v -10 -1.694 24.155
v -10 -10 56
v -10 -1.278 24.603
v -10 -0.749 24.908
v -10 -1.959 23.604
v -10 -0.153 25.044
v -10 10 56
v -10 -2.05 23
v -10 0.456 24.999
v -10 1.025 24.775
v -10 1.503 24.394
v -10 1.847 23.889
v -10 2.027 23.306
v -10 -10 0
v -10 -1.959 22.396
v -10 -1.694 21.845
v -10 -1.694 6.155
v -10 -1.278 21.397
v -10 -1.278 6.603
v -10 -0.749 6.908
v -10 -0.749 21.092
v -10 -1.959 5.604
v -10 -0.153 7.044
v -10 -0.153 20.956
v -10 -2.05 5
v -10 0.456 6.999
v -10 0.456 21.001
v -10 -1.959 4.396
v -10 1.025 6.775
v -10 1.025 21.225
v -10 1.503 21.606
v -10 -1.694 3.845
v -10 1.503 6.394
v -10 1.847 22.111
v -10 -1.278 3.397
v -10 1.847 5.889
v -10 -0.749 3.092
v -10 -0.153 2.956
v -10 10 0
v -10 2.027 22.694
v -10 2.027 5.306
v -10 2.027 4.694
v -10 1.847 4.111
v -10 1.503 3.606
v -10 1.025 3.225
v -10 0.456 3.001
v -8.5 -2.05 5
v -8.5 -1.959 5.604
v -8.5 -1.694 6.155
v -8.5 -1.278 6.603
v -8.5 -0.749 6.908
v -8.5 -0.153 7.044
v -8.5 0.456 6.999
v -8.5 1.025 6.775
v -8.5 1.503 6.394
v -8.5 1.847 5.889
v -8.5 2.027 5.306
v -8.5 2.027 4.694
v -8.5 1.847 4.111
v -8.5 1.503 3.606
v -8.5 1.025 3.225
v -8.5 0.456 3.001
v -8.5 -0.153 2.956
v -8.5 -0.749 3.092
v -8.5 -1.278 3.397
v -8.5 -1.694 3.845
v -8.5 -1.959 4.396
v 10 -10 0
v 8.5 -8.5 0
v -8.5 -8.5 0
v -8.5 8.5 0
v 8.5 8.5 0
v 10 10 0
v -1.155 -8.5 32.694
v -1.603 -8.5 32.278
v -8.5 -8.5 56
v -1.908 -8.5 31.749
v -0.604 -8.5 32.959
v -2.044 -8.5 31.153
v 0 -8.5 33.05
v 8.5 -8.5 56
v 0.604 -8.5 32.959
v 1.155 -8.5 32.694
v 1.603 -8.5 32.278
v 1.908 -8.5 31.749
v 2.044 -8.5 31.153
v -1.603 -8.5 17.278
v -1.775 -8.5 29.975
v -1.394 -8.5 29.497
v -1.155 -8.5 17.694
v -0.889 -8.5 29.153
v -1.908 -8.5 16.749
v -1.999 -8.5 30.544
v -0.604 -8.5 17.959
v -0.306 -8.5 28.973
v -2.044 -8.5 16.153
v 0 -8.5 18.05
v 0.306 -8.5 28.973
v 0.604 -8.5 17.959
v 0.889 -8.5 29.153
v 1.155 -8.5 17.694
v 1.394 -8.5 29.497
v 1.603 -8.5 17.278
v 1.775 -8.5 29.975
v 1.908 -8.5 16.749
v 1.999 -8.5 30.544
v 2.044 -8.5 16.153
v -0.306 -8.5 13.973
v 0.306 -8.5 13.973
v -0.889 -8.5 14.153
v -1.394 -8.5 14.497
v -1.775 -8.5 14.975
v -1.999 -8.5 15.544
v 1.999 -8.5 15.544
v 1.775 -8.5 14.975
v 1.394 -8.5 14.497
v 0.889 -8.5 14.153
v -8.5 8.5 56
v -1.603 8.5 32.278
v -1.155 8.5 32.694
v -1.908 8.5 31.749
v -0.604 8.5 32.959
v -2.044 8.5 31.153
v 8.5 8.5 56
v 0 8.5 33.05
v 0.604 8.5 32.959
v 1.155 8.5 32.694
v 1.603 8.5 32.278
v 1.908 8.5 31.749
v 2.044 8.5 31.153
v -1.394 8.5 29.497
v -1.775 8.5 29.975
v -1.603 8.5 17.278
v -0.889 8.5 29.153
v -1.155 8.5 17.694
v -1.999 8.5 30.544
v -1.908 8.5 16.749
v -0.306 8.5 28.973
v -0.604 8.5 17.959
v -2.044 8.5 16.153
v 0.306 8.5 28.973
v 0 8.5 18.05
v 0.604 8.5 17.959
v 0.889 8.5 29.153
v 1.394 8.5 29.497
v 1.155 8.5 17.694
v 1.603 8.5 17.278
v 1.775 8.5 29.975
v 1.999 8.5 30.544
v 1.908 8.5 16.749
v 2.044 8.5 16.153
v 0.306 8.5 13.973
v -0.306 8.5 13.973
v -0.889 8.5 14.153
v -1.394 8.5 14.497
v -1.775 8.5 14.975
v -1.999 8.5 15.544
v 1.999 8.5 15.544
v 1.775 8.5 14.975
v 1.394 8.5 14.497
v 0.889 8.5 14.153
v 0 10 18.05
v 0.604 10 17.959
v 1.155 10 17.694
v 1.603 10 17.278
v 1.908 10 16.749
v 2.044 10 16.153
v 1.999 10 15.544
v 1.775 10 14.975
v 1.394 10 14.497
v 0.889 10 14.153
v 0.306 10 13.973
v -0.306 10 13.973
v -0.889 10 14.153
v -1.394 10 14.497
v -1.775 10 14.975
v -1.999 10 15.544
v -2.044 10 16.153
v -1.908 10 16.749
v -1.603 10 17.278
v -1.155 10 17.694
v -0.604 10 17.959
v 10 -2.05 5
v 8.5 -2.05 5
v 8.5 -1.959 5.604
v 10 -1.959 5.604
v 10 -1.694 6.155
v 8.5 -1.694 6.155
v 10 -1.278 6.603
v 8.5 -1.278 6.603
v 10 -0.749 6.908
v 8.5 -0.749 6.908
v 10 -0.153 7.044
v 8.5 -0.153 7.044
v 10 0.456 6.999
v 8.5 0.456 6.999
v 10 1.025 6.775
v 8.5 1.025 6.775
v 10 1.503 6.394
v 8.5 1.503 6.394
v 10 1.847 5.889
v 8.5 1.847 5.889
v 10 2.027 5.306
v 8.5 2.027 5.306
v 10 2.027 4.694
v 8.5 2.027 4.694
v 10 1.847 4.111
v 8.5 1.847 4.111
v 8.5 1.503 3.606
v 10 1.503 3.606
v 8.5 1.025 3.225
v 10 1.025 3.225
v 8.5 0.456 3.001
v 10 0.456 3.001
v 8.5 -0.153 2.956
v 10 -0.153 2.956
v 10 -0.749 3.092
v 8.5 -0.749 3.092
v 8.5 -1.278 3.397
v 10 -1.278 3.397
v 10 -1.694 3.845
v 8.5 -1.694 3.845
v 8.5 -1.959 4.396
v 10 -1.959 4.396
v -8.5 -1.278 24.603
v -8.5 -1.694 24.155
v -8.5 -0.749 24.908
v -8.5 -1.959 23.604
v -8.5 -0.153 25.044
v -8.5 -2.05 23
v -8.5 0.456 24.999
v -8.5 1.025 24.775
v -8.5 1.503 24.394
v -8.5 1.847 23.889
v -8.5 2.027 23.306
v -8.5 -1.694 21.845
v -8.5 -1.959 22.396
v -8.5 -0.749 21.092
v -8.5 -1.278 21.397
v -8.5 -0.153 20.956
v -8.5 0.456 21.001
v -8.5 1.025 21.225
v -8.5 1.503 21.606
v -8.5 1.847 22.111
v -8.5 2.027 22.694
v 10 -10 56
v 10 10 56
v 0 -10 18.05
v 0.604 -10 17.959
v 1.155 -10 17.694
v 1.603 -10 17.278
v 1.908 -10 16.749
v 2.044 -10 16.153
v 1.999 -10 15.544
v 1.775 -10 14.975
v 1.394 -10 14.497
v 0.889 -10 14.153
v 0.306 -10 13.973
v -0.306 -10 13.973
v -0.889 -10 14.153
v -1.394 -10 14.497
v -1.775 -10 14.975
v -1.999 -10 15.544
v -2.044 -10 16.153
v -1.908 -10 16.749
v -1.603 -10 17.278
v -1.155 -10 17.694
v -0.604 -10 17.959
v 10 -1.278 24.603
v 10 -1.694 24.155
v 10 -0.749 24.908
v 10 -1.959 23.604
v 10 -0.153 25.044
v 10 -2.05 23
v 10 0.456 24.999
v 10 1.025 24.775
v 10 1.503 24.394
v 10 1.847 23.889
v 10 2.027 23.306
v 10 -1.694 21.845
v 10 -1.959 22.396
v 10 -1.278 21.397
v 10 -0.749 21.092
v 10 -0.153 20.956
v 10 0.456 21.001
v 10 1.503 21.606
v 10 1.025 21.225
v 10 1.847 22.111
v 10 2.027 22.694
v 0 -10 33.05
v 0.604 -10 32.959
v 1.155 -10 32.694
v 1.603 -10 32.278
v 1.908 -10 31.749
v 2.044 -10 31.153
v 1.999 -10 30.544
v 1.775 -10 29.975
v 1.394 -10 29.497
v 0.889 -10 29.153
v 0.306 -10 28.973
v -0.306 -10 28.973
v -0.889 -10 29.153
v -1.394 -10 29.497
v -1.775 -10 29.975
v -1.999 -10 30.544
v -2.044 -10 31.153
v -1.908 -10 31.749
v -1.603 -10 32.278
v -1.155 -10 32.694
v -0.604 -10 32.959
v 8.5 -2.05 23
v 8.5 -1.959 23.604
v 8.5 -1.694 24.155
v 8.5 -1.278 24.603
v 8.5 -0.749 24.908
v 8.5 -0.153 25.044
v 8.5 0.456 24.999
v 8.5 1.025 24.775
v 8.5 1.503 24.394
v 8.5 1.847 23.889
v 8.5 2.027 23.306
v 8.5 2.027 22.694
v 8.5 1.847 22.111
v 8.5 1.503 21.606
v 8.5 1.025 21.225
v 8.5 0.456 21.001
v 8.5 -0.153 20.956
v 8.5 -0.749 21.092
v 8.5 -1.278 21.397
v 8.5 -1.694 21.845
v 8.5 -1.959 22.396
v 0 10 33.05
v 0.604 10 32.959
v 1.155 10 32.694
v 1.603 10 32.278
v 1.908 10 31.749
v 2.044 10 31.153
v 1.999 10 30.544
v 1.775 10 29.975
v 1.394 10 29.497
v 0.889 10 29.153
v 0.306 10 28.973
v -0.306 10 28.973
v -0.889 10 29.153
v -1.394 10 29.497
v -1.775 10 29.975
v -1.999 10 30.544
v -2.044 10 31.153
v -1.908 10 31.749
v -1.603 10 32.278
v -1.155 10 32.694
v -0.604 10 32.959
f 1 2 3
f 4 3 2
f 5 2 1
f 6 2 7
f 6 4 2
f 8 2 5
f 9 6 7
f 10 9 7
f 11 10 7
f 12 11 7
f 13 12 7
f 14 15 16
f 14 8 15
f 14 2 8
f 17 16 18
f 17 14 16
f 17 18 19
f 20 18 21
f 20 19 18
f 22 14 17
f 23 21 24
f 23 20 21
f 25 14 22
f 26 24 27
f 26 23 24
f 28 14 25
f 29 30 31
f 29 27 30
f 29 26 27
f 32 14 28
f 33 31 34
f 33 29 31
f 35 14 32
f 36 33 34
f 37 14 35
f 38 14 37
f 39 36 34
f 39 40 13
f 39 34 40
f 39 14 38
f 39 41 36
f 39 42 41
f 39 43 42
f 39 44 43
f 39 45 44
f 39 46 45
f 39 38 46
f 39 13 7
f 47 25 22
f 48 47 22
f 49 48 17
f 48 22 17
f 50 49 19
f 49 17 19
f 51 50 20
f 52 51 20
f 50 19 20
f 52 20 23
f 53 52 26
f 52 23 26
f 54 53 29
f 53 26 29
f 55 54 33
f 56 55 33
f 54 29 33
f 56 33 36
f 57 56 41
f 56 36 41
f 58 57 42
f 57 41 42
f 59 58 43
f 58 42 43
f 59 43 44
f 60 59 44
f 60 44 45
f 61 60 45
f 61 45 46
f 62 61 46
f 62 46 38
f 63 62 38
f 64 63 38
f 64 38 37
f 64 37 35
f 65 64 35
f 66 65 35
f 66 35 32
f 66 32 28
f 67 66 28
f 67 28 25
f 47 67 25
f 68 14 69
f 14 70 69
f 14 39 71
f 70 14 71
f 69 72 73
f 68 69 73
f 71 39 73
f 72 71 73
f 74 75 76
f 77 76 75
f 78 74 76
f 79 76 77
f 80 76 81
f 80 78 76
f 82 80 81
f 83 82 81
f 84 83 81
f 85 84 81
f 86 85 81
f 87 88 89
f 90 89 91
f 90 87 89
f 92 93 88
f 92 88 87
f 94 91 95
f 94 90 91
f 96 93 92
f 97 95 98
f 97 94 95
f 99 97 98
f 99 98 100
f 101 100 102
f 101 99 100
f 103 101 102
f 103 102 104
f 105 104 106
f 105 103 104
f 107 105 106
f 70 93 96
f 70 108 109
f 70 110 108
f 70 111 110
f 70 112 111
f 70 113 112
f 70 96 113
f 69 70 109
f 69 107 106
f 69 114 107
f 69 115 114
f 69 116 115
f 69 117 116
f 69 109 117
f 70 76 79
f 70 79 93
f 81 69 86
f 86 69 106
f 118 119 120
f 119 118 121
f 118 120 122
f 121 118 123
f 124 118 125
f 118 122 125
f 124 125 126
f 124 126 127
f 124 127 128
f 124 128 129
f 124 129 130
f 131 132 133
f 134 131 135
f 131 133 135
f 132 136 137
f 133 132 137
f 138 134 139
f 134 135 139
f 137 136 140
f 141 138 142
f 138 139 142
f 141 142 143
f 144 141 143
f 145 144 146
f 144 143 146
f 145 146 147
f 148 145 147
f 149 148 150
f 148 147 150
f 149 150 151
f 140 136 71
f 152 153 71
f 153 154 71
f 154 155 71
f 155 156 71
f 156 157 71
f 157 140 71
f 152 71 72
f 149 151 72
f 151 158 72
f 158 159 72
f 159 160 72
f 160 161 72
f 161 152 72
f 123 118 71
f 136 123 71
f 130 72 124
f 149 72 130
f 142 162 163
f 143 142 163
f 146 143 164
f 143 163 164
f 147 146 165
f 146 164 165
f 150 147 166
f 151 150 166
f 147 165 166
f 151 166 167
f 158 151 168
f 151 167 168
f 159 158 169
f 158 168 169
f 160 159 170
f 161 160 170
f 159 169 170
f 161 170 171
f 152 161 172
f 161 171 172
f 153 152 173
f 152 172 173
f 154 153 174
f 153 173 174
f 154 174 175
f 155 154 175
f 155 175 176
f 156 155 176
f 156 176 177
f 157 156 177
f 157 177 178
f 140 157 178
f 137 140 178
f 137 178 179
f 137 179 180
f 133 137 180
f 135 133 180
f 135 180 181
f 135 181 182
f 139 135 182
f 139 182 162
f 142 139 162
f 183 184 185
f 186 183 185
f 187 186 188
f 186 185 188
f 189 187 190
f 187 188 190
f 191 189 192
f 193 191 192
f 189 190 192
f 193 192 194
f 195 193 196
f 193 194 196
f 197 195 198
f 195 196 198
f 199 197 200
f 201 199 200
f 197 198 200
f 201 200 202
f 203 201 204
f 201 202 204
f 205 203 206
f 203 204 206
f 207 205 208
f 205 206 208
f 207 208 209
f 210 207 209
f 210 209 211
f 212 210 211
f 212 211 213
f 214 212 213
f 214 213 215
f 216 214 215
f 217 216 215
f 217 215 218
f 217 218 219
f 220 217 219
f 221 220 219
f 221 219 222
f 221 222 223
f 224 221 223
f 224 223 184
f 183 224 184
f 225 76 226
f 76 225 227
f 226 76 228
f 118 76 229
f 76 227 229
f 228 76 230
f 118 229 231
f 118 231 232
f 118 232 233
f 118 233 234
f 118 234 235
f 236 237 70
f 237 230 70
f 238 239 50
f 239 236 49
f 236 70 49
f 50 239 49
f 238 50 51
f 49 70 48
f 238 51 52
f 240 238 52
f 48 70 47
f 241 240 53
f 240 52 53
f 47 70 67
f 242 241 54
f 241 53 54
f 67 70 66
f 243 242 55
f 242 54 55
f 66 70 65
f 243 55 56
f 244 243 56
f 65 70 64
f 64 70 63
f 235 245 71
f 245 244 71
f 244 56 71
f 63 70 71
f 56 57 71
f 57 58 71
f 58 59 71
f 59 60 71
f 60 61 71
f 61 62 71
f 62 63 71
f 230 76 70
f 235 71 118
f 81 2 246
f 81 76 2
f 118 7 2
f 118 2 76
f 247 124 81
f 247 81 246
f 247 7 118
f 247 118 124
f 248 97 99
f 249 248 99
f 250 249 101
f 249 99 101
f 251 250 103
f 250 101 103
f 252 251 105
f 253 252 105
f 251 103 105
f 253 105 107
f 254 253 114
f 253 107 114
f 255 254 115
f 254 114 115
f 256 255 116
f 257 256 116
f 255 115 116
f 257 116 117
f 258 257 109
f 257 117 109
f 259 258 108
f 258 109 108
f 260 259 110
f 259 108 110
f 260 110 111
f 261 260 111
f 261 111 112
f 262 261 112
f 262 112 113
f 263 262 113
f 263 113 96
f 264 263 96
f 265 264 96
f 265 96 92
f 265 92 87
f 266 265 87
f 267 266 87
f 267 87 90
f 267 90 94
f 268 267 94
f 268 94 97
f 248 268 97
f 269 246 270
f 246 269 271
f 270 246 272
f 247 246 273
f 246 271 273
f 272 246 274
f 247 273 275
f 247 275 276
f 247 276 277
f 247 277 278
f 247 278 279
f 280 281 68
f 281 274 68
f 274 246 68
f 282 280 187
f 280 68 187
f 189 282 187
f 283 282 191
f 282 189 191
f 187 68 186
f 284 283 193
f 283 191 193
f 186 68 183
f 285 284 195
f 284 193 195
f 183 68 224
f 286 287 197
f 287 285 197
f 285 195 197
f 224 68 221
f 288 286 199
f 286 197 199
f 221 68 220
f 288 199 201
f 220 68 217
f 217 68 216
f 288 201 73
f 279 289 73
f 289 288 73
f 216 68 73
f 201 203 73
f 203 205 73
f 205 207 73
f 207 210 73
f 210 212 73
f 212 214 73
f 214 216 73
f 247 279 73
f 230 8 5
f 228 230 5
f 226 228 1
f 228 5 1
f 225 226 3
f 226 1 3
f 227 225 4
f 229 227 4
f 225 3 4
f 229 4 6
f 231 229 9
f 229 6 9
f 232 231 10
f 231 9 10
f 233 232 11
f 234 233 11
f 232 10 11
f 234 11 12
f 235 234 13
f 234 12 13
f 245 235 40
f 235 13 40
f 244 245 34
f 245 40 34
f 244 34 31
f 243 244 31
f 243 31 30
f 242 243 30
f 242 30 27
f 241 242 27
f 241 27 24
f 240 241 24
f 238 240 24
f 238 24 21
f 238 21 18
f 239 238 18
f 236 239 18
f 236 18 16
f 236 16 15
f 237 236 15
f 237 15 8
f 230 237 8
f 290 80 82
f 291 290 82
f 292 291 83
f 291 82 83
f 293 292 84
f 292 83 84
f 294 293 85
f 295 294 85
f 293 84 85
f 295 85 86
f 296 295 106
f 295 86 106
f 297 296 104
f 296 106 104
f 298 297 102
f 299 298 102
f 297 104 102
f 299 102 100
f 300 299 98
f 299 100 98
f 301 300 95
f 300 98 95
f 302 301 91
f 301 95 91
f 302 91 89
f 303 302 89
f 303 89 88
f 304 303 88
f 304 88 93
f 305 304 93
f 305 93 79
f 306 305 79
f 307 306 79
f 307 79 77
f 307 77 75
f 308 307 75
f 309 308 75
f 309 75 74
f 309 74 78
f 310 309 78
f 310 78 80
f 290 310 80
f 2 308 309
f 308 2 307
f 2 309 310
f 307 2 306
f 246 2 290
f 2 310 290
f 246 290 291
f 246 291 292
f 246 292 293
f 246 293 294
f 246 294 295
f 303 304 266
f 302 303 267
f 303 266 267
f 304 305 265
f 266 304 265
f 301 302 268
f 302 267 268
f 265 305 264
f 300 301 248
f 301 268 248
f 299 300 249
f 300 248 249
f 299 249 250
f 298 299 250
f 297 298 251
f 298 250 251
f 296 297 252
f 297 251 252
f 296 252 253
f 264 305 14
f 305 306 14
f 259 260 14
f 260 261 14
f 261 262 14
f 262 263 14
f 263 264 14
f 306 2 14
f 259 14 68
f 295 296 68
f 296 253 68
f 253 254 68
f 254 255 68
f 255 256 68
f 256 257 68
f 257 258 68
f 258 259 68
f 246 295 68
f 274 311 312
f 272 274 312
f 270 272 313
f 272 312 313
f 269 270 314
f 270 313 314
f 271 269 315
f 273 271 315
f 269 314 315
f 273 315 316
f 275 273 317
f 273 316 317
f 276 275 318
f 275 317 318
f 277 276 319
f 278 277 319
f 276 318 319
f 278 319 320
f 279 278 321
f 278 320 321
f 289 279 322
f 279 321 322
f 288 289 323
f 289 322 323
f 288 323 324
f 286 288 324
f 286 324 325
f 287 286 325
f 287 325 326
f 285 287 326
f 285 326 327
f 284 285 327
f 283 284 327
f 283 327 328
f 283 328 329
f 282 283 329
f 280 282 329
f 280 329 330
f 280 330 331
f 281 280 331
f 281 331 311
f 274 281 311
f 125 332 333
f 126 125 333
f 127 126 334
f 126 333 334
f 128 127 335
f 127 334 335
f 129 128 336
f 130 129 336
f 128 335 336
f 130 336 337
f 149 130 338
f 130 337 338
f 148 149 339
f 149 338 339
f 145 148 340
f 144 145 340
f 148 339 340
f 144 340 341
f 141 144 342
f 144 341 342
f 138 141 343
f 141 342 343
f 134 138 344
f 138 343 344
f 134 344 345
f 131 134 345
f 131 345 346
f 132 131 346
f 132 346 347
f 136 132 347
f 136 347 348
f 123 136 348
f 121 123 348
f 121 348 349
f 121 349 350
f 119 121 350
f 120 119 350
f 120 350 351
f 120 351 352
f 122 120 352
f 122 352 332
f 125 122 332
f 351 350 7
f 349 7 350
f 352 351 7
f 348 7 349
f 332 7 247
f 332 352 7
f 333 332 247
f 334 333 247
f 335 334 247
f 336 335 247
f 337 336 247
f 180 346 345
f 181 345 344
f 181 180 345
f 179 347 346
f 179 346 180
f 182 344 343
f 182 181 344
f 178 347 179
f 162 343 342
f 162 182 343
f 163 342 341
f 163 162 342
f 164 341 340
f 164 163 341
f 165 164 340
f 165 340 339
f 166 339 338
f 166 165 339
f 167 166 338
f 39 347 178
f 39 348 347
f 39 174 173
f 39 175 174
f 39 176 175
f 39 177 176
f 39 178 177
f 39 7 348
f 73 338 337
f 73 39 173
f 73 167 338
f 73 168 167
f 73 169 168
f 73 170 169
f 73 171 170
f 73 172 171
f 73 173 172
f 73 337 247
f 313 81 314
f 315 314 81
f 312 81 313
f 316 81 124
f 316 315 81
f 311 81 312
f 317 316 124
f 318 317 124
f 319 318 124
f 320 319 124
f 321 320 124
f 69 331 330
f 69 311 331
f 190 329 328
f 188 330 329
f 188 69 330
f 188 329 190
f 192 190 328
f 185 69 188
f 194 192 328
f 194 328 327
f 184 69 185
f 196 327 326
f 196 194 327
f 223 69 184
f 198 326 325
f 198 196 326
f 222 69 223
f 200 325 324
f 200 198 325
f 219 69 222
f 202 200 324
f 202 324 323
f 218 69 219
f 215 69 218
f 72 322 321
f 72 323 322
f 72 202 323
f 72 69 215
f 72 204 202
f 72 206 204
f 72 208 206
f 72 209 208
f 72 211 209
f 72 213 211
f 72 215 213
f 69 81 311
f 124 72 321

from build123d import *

# Parameters (mm, degrees)
SKETCH_1_W          = 20
SKETCH_1_H          = 20
SKETCH_1_W_2        = 17
SKETCH_1_H_2        = 17
EXTRUDE_1_DEPTH     = 56
SKETCH_3_R          = 2.05
CUT_EXTRUDE_1_DEPTH = 23
SKETCH_4_R          = 2.05
CUT_EXTRUDE_2_DEPTH = 23


with BuildPart() as part:
    # 草图1 → 凸台-拉伸1 (new body)
    with BuildSketch(Plane.XY):
        Rectangle(SKETCH_1_W, SKETCH_1_H)
        Rectangle(SKETCH_1_W_2, SKETCH_1_H_2, mode=Mode.SUBTRACT)
    extrude(amount=EXTRUDE_1_DEPTH)

    # 草图3 → 切除-拉伸1 (cut)
    with BuildSketch(Plane.ZY.offset(10)):
        with Locations(Location((5, 0, 0), (0, 0, 270))):
            Circle(SKETCH_3_R)
        with Locations(Location((23, 0, 0), (0, 0, 270))):
            Circle(SKETCH_3_R)
    extrude(amount=-CUT_EXTRUDE_1_DEPTH, mode=Mode.SUBTRACT)

    # 草图4 → 切除-拉伸2 (cut)
    with BuildSketch(Plane(origin=(0, 10, 0), x_dir=(1, 0, 0), z_dir=(0, 1, 0))):
        with Locations(Location((0, -16, 0), (0, 0, 270))):
            Circle(SKETCH_4_R)
        with Locations(Location((0, -31, 0), (0, 0, 270))):
            Circle(SKETCH_4_R)
    extrude(amount=-CUT_EXTRUDE_2_DEPTH, mode=Mode.SUBTRACT)


solid = part.part
